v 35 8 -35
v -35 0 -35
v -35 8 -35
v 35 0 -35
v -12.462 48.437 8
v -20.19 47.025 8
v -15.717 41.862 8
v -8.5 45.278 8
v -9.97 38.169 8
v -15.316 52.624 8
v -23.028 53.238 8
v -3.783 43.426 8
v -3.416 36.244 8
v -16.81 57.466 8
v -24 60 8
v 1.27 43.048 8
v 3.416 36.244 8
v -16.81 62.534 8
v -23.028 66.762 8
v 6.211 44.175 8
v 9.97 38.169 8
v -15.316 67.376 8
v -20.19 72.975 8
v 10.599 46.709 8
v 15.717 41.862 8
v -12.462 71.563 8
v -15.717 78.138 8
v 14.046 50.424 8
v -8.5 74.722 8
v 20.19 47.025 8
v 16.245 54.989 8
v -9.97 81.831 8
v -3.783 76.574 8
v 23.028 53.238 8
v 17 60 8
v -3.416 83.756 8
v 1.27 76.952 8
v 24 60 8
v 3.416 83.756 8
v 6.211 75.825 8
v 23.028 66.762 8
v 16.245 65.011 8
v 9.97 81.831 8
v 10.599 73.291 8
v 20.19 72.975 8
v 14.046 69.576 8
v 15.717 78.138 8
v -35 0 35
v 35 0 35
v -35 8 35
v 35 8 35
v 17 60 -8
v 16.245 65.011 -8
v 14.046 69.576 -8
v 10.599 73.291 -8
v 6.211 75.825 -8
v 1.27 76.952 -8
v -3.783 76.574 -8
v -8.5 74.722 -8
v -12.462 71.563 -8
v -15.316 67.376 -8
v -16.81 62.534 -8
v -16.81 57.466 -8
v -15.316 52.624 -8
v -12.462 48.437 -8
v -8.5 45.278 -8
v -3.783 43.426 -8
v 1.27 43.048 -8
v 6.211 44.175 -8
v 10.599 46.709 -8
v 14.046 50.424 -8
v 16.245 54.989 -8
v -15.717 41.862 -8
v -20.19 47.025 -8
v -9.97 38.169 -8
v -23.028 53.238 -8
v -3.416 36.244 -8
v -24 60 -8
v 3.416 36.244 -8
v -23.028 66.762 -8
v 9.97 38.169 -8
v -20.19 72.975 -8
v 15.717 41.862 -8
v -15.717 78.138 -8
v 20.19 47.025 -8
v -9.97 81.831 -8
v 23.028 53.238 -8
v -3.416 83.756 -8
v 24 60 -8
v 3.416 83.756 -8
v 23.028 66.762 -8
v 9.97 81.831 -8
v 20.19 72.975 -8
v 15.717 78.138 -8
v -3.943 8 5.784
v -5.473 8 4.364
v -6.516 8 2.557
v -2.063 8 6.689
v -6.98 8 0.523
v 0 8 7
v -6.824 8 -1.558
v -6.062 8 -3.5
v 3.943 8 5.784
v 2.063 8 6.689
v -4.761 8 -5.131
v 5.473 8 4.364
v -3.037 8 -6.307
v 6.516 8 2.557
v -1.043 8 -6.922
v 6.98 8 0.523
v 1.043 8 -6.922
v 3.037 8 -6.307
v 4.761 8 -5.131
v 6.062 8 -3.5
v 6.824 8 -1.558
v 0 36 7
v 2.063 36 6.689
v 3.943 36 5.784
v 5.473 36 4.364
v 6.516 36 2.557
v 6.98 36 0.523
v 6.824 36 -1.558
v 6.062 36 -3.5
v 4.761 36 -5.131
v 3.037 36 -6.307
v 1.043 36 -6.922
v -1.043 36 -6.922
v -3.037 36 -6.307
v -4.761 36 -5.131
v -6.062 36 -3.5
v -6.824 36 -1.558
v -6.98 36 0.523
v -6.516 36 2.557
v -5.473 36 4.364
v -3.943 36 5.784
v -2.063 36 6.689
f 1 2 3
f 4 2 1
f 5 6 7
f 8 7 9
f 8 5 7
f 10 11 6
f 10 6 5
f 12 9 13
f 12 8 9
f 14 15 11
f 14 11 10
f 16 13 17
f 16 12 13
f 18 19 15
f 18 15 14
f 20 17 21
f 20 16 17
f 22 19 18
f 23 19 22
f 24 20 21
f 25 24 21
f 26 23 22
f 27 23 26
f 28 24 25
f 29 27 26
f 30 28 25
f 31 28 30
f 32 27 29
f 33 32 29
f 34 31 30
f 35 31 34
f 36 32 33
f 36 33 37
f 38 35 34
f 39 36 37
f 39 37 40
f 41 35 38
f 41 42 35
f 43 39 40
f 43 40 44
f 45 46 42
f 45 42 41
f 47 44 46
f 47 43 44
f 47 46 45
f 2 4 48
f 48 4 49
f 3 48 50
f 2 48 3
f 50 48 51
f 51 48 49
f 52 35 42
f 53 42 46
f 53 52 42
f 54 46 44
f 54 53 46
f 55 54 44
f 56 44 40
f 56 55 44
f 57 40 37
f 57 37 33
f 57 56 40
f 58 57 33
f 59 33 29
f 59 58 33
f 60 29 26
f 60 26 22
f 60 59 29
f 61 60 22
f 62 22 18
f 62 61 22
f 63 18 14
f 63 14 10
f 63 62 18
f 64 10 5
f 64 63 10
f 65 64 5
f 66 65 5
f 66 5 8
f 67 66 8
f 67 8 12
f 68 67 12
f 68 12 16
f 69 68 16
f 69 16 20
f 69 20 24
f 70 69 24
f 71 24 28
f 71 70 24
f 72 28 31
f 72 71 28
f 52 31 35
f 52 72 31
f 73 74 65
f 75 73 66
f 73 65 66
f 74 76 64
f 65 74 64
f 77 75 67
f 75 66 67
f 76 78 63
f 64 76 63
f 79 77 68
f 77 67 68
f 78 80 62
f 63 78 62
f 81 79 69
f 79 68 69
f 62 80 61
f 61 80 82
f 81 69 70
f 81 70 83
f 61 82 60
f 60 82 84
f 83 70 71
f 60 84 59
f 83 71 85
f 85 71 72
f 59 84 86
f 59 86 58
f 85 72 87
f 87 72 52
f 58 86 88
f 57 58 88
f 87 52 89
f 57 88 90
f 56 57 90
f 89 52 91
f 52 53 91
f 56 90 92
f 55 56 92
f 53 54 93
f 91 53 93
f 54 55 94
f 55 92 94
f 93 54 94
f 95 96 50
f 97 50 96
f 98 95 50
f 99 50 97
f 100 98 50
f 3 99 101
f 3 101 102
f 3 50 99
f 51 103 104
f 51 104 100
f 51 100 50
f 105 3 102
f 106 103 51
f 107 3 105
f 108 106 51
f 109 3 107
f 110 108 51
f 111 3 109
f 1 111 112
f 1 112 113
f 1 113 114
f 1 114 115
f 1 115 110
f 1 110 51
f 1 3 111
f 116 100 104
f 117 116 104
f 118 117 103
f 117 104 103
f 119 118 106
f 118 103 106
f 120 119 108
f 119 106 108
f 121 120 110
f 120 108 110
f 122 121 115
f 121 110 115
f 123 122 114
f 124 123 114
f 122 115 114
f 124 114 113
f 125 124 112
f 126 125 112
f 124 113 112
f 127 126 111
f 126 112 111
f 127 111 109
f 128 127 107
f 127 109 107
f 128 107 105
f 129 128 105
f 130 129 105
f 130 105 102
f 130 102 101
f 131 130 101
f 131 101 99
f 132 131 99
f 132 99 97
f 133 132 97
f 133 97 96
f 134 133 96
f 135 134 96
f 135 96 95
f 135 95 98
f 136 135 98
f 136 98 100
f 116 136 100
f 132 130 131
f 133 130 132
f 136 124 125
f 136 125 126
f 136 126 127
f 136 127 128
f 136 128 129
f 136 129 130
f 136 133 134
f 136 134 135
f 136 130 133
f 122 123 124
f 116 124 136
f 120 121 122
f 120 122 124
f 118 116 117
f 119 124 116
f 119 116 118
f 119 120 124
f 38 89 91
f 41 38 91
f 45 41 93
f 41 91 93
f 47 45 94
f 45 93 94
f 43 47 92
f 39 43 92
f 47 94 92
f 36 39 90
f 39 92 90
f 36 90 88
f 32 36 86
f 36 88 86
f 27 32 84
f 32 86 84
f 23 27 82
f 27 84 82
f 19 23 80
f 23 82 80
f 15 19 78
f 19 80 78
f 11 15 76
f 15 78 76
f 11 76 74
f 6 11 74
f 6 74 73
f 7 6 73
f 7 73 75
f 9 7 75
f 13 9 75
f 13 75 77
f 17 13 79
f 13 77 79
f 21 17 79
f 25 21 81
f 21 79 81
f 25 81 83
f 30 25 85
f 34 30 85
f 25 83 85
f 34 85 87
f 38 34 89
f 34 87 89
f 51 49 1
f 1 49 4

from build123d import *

# Parameters (mm, degrees)
SKETCH1_W                = 70
SKETCH1_H                = 70
BOSS_EXTRUDE1_DEPTH      = 8
SKETCH2_R                = 7
BOSS_EXTRUDE2_DEPTH      = 36
BOSS_EXTRUDE3_DEPTH      = 8
BOSS_EXTRUDE3_DEPTH_BACK = 8
SKETCH3_R                = 24
SKETCH3_R_2              = 17


with BuildPart() as part:
    # Sketch1 → Boss-Extrude1 (new body)
    with BuildSketch(Plane(origin=(0, 0, 0), x_dir=(1, 0, 0), z_dir=(0, 1, 0))):
        Rectangle(SKETCH1_W, SKETCH1_H)
    extrude(amount=BOSS_EXTRUDE1_DEPTH)

    # Sketch2 → Boss-Extrude2 (add)
    with BuildSketch(Plane(origin=(0, 0, 0), x_dir=(1, 0, 0), z_dir=(0, 1, 0))):
        with Locations(Location((0, 0, 0), (0, 0, 270))):
            Circle(SKETCH2_R)
    extrude(amount=BOSS_EXTRUDE2_DEPTH)


with BuildPart() as body_2:
    # Sketch3 → Boss-Extrude3 (new, two sides: drawn at the far end of the back side and taken through both)
    with BuildSketch(Plane.XY.offset(-BOSS_EXTRUDE3_DEPTH_BACK)):
        with Locations((0, 60)):
            Circle(SKETCH3_R)
        with Locations((0, 60)):
            Circle(SKETCH3_R_2, mode=Mode.SUBTRACT)
    extrude(amount=BOSS_EXTRUDE3_DEPTH + BOSS_EXTRUDE3_DEPTH_BACK)


solid = Compound([part.part, body_2.part])
